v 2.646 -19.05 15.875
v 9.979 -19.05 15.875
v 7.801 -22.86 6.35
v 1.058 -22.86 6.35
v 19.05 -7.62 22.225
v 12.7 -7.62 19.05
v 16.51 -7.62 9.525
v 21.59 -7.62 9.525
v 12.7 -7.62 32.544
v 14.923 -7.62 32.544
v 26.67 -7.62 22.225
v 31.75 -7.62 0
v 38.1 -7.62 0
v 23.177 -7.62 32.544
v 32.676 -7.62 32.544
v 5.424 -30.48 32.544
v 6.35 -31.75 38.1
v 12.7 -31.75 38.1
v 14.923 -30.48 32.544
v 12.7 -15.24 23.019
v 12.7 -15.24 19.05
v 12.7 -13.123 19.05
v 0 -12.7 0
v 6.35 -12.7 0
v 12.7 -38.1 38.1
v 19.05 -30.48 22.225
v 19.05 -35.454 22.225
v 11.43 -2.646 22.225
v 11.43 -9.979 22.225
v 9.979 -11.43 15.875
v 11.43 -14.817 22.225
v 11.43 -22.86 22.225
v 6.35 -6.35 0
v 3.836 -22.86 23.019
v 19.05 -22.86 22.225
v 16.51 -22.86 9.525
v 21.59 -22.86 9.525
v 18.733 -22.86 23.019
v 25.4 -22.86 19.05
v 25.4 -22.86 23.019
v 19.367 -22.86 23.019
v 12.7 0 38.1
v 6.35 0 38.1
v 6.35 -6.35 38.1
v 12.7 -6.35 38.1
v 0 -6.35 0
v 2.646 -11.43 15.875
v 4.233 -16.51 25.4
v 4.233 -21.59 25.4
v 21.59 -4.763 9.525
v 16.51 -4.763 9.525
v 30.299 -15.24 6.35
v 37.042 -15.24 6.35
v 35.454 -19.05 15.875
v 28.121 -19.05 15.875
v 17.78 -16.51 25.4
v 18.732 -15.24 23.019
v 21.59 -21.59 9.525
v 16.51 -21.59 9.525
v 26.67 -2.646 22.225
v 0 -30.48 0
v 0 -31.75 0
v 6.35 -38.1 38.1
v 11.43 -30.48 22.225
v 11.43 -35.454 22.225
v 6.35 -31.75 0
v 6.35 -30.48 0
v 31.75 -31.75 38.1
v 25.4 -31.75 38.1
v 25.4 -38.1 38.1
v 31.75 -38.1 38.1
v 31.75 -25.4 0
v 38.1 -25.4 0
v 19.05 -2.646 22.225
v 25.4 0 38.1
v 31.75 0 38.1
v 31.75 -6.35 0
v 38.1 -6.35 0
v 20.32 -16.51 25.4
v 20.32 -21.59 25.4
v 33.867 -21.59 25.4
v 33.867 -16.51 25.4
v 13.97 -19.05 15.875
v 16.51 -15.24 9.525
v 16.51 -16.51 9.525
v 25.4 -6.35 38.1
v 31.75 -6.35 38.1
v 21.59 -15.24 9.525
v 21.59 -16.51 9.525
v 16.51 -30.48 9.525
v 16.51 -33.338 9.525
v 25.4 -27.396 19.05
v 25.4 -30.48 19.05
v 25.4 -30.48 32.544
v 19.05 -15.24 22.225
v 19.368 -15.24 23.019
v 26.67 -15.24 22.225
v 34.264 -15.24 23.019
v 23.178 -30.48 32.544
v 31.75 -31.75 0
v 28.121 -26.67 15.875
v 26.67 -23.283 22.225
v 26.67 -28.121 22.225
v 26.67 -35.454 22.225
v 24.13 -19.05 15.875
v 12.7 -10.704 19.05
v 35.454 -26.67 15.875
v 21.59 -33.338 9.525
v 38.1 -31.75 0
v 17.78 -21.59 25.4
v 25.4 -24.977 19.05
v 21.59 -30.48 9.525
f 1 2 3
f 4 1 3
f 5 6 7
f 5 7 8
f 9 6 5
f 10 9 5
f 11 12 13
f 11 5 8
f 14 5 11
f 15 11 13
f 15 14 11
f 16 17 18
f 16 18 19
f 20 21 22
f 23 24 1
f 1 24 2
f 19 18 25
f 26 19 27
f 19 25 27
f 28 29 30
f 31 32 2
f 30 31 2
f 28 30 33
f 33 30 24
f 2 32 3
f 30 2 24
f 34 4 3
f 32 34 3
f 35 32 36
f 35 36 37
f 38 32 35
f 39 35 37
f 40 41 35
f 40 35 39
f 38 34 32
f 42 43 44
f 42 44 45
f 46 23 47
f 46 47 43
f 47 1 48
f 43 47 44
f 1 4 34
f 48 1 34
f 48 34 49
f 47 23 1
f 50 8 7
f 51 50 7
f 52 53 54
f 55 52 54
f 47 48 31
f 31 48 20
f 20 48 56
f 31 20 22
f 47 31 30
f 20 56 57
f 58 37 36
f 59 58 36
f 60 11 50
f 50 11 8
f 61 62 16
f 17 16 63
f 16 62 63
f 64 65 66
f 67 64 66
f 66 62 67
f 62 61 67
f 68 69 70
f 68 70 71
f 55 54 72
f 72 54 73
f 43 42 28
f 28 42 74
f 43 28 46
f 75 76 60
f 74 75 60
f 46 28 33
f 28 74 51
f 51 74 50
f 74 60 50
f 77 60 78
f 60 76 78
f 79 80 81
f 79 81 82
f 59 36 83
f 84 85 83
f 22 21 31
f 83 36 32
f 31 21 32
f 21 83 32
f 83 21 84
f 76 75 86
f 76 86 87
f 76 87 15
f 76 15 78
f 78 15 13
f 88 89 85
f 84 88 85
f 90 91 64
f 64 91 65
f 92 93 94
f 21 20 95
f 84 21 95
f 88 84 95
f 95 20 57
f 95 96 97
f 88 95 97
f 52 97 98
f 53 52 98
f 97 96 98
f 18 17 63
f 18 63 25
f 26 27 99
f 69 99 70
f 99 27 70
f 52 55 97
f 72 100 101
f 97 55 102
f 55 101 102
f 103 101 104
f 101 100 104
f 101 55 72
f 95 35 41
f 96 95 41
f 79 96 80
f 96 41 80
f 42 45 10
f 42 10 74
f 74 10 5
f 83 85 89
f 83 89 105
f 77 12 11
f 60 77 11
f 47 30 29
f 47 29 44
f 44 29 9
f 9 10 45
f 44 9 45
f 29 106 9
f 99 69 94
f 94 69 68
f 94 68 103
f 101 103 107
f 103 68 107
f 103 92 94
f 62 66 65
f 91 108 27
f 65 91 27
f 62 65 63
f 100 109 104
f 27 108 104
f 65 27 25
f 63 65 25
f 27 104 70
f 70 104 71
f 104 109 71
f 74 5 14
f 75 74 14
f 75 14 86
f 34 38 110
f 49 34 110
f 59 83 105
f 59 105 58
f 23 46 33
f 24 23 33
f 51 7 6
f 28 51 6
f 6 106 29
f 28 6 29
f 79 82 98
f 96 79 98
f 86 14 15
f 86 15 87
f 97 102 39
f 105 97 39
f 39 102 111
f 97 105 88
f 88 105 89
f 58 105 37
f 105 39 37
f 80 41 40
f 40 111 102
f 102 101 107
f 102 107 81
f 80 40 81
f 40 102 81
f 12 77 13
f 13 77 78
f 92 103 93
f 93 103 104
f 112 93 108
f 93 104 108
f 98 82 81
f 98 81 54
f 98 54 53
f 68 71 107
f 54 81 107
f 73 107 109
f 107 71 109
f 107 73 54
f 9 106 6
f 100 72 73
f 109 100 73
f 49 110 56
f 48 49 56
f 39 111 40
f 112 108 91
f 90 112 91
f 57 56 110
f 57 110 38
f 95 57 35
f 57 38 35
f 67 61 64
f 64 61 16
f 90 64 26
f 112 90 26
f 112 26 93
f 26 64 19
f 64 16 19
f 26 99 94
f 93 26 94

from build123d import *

# Parameters (mm, degrees)
F0_W     = 38.1
F0_H     = 38.1
F1_DEPTH = 38.1
F5_DEPTH = 38.1
F7_DEPTH = 38.1
F8_W     = 25.4
F8_H     = 7.62
F9_DEPTH = 38.1


with BuildPart() as f1:
    # F0 (on Front) → F1 (new body)
    with BuildSketch(Plane.XZ):
        with Locations((19.05, 19.05)):
            Rectangle(F0_W, F0_H)
    extrude(amount=F1_DEPTH)

    # F4 (on face) → F5 (cut)
    with BuildSketch(Plane.YZ.offset(38.1)):
        Polygon((-6.35, 38.1), (-31.75, 38.1), (-26.67, 15.875), (-21.59, 25.4), (-16.51, 25.4), (-11.43, 15.875), align=None)
        Polygon((-31.75, 0), (-38.1, 38.1), (-38.1, 0), align=None)
        Polygon((-19.05, 15.875), (-25.4, 0), (-12.7, 0), align=None)
        Polygon((0, 0), (0, 38.1), (-6.35, 0), align=None)
    extrude(amount=-F5_DEPTH, mode=Mode.SUBTRACT)

    # F6 (on offset) → F7 (cut)
    with BuildSketch(Plane.XZ.offset(38.1)):
        Polygon((25.4, 38.1), (12.7, 38.1), (19.05, 22.225), align=None)
        Polygon((6.35, 38.1), (0, 38.1), (0, 0), align=None)
        Polygon((11.43, 22.225), (6.35, 0), (31.75, 0), (26.67, 22.225), (21.59, 9.525), (16.51, 9.525), align=None)
        Polygon((31.75, 38.1), (38.1, 0), (38.1, 38.1), align=None)
    extrude(amount=-F7_DEPTH, mode=Mode.SUBTRACT)

    # F8 (on offset) → F9 (cut)
    with BuildSketch(Plane.XY.offset(38.1)):
        with Locations((12.7, -26.67)):
            Rectangle(F8_W, F8_H)
        with Locations((25.4, -11.43)):
            Rectangle(F8_W, F8_H)
    extrude(amount=-F9_DEPTH, mode=Mode.SUBTRACT)


solid = f1.part
